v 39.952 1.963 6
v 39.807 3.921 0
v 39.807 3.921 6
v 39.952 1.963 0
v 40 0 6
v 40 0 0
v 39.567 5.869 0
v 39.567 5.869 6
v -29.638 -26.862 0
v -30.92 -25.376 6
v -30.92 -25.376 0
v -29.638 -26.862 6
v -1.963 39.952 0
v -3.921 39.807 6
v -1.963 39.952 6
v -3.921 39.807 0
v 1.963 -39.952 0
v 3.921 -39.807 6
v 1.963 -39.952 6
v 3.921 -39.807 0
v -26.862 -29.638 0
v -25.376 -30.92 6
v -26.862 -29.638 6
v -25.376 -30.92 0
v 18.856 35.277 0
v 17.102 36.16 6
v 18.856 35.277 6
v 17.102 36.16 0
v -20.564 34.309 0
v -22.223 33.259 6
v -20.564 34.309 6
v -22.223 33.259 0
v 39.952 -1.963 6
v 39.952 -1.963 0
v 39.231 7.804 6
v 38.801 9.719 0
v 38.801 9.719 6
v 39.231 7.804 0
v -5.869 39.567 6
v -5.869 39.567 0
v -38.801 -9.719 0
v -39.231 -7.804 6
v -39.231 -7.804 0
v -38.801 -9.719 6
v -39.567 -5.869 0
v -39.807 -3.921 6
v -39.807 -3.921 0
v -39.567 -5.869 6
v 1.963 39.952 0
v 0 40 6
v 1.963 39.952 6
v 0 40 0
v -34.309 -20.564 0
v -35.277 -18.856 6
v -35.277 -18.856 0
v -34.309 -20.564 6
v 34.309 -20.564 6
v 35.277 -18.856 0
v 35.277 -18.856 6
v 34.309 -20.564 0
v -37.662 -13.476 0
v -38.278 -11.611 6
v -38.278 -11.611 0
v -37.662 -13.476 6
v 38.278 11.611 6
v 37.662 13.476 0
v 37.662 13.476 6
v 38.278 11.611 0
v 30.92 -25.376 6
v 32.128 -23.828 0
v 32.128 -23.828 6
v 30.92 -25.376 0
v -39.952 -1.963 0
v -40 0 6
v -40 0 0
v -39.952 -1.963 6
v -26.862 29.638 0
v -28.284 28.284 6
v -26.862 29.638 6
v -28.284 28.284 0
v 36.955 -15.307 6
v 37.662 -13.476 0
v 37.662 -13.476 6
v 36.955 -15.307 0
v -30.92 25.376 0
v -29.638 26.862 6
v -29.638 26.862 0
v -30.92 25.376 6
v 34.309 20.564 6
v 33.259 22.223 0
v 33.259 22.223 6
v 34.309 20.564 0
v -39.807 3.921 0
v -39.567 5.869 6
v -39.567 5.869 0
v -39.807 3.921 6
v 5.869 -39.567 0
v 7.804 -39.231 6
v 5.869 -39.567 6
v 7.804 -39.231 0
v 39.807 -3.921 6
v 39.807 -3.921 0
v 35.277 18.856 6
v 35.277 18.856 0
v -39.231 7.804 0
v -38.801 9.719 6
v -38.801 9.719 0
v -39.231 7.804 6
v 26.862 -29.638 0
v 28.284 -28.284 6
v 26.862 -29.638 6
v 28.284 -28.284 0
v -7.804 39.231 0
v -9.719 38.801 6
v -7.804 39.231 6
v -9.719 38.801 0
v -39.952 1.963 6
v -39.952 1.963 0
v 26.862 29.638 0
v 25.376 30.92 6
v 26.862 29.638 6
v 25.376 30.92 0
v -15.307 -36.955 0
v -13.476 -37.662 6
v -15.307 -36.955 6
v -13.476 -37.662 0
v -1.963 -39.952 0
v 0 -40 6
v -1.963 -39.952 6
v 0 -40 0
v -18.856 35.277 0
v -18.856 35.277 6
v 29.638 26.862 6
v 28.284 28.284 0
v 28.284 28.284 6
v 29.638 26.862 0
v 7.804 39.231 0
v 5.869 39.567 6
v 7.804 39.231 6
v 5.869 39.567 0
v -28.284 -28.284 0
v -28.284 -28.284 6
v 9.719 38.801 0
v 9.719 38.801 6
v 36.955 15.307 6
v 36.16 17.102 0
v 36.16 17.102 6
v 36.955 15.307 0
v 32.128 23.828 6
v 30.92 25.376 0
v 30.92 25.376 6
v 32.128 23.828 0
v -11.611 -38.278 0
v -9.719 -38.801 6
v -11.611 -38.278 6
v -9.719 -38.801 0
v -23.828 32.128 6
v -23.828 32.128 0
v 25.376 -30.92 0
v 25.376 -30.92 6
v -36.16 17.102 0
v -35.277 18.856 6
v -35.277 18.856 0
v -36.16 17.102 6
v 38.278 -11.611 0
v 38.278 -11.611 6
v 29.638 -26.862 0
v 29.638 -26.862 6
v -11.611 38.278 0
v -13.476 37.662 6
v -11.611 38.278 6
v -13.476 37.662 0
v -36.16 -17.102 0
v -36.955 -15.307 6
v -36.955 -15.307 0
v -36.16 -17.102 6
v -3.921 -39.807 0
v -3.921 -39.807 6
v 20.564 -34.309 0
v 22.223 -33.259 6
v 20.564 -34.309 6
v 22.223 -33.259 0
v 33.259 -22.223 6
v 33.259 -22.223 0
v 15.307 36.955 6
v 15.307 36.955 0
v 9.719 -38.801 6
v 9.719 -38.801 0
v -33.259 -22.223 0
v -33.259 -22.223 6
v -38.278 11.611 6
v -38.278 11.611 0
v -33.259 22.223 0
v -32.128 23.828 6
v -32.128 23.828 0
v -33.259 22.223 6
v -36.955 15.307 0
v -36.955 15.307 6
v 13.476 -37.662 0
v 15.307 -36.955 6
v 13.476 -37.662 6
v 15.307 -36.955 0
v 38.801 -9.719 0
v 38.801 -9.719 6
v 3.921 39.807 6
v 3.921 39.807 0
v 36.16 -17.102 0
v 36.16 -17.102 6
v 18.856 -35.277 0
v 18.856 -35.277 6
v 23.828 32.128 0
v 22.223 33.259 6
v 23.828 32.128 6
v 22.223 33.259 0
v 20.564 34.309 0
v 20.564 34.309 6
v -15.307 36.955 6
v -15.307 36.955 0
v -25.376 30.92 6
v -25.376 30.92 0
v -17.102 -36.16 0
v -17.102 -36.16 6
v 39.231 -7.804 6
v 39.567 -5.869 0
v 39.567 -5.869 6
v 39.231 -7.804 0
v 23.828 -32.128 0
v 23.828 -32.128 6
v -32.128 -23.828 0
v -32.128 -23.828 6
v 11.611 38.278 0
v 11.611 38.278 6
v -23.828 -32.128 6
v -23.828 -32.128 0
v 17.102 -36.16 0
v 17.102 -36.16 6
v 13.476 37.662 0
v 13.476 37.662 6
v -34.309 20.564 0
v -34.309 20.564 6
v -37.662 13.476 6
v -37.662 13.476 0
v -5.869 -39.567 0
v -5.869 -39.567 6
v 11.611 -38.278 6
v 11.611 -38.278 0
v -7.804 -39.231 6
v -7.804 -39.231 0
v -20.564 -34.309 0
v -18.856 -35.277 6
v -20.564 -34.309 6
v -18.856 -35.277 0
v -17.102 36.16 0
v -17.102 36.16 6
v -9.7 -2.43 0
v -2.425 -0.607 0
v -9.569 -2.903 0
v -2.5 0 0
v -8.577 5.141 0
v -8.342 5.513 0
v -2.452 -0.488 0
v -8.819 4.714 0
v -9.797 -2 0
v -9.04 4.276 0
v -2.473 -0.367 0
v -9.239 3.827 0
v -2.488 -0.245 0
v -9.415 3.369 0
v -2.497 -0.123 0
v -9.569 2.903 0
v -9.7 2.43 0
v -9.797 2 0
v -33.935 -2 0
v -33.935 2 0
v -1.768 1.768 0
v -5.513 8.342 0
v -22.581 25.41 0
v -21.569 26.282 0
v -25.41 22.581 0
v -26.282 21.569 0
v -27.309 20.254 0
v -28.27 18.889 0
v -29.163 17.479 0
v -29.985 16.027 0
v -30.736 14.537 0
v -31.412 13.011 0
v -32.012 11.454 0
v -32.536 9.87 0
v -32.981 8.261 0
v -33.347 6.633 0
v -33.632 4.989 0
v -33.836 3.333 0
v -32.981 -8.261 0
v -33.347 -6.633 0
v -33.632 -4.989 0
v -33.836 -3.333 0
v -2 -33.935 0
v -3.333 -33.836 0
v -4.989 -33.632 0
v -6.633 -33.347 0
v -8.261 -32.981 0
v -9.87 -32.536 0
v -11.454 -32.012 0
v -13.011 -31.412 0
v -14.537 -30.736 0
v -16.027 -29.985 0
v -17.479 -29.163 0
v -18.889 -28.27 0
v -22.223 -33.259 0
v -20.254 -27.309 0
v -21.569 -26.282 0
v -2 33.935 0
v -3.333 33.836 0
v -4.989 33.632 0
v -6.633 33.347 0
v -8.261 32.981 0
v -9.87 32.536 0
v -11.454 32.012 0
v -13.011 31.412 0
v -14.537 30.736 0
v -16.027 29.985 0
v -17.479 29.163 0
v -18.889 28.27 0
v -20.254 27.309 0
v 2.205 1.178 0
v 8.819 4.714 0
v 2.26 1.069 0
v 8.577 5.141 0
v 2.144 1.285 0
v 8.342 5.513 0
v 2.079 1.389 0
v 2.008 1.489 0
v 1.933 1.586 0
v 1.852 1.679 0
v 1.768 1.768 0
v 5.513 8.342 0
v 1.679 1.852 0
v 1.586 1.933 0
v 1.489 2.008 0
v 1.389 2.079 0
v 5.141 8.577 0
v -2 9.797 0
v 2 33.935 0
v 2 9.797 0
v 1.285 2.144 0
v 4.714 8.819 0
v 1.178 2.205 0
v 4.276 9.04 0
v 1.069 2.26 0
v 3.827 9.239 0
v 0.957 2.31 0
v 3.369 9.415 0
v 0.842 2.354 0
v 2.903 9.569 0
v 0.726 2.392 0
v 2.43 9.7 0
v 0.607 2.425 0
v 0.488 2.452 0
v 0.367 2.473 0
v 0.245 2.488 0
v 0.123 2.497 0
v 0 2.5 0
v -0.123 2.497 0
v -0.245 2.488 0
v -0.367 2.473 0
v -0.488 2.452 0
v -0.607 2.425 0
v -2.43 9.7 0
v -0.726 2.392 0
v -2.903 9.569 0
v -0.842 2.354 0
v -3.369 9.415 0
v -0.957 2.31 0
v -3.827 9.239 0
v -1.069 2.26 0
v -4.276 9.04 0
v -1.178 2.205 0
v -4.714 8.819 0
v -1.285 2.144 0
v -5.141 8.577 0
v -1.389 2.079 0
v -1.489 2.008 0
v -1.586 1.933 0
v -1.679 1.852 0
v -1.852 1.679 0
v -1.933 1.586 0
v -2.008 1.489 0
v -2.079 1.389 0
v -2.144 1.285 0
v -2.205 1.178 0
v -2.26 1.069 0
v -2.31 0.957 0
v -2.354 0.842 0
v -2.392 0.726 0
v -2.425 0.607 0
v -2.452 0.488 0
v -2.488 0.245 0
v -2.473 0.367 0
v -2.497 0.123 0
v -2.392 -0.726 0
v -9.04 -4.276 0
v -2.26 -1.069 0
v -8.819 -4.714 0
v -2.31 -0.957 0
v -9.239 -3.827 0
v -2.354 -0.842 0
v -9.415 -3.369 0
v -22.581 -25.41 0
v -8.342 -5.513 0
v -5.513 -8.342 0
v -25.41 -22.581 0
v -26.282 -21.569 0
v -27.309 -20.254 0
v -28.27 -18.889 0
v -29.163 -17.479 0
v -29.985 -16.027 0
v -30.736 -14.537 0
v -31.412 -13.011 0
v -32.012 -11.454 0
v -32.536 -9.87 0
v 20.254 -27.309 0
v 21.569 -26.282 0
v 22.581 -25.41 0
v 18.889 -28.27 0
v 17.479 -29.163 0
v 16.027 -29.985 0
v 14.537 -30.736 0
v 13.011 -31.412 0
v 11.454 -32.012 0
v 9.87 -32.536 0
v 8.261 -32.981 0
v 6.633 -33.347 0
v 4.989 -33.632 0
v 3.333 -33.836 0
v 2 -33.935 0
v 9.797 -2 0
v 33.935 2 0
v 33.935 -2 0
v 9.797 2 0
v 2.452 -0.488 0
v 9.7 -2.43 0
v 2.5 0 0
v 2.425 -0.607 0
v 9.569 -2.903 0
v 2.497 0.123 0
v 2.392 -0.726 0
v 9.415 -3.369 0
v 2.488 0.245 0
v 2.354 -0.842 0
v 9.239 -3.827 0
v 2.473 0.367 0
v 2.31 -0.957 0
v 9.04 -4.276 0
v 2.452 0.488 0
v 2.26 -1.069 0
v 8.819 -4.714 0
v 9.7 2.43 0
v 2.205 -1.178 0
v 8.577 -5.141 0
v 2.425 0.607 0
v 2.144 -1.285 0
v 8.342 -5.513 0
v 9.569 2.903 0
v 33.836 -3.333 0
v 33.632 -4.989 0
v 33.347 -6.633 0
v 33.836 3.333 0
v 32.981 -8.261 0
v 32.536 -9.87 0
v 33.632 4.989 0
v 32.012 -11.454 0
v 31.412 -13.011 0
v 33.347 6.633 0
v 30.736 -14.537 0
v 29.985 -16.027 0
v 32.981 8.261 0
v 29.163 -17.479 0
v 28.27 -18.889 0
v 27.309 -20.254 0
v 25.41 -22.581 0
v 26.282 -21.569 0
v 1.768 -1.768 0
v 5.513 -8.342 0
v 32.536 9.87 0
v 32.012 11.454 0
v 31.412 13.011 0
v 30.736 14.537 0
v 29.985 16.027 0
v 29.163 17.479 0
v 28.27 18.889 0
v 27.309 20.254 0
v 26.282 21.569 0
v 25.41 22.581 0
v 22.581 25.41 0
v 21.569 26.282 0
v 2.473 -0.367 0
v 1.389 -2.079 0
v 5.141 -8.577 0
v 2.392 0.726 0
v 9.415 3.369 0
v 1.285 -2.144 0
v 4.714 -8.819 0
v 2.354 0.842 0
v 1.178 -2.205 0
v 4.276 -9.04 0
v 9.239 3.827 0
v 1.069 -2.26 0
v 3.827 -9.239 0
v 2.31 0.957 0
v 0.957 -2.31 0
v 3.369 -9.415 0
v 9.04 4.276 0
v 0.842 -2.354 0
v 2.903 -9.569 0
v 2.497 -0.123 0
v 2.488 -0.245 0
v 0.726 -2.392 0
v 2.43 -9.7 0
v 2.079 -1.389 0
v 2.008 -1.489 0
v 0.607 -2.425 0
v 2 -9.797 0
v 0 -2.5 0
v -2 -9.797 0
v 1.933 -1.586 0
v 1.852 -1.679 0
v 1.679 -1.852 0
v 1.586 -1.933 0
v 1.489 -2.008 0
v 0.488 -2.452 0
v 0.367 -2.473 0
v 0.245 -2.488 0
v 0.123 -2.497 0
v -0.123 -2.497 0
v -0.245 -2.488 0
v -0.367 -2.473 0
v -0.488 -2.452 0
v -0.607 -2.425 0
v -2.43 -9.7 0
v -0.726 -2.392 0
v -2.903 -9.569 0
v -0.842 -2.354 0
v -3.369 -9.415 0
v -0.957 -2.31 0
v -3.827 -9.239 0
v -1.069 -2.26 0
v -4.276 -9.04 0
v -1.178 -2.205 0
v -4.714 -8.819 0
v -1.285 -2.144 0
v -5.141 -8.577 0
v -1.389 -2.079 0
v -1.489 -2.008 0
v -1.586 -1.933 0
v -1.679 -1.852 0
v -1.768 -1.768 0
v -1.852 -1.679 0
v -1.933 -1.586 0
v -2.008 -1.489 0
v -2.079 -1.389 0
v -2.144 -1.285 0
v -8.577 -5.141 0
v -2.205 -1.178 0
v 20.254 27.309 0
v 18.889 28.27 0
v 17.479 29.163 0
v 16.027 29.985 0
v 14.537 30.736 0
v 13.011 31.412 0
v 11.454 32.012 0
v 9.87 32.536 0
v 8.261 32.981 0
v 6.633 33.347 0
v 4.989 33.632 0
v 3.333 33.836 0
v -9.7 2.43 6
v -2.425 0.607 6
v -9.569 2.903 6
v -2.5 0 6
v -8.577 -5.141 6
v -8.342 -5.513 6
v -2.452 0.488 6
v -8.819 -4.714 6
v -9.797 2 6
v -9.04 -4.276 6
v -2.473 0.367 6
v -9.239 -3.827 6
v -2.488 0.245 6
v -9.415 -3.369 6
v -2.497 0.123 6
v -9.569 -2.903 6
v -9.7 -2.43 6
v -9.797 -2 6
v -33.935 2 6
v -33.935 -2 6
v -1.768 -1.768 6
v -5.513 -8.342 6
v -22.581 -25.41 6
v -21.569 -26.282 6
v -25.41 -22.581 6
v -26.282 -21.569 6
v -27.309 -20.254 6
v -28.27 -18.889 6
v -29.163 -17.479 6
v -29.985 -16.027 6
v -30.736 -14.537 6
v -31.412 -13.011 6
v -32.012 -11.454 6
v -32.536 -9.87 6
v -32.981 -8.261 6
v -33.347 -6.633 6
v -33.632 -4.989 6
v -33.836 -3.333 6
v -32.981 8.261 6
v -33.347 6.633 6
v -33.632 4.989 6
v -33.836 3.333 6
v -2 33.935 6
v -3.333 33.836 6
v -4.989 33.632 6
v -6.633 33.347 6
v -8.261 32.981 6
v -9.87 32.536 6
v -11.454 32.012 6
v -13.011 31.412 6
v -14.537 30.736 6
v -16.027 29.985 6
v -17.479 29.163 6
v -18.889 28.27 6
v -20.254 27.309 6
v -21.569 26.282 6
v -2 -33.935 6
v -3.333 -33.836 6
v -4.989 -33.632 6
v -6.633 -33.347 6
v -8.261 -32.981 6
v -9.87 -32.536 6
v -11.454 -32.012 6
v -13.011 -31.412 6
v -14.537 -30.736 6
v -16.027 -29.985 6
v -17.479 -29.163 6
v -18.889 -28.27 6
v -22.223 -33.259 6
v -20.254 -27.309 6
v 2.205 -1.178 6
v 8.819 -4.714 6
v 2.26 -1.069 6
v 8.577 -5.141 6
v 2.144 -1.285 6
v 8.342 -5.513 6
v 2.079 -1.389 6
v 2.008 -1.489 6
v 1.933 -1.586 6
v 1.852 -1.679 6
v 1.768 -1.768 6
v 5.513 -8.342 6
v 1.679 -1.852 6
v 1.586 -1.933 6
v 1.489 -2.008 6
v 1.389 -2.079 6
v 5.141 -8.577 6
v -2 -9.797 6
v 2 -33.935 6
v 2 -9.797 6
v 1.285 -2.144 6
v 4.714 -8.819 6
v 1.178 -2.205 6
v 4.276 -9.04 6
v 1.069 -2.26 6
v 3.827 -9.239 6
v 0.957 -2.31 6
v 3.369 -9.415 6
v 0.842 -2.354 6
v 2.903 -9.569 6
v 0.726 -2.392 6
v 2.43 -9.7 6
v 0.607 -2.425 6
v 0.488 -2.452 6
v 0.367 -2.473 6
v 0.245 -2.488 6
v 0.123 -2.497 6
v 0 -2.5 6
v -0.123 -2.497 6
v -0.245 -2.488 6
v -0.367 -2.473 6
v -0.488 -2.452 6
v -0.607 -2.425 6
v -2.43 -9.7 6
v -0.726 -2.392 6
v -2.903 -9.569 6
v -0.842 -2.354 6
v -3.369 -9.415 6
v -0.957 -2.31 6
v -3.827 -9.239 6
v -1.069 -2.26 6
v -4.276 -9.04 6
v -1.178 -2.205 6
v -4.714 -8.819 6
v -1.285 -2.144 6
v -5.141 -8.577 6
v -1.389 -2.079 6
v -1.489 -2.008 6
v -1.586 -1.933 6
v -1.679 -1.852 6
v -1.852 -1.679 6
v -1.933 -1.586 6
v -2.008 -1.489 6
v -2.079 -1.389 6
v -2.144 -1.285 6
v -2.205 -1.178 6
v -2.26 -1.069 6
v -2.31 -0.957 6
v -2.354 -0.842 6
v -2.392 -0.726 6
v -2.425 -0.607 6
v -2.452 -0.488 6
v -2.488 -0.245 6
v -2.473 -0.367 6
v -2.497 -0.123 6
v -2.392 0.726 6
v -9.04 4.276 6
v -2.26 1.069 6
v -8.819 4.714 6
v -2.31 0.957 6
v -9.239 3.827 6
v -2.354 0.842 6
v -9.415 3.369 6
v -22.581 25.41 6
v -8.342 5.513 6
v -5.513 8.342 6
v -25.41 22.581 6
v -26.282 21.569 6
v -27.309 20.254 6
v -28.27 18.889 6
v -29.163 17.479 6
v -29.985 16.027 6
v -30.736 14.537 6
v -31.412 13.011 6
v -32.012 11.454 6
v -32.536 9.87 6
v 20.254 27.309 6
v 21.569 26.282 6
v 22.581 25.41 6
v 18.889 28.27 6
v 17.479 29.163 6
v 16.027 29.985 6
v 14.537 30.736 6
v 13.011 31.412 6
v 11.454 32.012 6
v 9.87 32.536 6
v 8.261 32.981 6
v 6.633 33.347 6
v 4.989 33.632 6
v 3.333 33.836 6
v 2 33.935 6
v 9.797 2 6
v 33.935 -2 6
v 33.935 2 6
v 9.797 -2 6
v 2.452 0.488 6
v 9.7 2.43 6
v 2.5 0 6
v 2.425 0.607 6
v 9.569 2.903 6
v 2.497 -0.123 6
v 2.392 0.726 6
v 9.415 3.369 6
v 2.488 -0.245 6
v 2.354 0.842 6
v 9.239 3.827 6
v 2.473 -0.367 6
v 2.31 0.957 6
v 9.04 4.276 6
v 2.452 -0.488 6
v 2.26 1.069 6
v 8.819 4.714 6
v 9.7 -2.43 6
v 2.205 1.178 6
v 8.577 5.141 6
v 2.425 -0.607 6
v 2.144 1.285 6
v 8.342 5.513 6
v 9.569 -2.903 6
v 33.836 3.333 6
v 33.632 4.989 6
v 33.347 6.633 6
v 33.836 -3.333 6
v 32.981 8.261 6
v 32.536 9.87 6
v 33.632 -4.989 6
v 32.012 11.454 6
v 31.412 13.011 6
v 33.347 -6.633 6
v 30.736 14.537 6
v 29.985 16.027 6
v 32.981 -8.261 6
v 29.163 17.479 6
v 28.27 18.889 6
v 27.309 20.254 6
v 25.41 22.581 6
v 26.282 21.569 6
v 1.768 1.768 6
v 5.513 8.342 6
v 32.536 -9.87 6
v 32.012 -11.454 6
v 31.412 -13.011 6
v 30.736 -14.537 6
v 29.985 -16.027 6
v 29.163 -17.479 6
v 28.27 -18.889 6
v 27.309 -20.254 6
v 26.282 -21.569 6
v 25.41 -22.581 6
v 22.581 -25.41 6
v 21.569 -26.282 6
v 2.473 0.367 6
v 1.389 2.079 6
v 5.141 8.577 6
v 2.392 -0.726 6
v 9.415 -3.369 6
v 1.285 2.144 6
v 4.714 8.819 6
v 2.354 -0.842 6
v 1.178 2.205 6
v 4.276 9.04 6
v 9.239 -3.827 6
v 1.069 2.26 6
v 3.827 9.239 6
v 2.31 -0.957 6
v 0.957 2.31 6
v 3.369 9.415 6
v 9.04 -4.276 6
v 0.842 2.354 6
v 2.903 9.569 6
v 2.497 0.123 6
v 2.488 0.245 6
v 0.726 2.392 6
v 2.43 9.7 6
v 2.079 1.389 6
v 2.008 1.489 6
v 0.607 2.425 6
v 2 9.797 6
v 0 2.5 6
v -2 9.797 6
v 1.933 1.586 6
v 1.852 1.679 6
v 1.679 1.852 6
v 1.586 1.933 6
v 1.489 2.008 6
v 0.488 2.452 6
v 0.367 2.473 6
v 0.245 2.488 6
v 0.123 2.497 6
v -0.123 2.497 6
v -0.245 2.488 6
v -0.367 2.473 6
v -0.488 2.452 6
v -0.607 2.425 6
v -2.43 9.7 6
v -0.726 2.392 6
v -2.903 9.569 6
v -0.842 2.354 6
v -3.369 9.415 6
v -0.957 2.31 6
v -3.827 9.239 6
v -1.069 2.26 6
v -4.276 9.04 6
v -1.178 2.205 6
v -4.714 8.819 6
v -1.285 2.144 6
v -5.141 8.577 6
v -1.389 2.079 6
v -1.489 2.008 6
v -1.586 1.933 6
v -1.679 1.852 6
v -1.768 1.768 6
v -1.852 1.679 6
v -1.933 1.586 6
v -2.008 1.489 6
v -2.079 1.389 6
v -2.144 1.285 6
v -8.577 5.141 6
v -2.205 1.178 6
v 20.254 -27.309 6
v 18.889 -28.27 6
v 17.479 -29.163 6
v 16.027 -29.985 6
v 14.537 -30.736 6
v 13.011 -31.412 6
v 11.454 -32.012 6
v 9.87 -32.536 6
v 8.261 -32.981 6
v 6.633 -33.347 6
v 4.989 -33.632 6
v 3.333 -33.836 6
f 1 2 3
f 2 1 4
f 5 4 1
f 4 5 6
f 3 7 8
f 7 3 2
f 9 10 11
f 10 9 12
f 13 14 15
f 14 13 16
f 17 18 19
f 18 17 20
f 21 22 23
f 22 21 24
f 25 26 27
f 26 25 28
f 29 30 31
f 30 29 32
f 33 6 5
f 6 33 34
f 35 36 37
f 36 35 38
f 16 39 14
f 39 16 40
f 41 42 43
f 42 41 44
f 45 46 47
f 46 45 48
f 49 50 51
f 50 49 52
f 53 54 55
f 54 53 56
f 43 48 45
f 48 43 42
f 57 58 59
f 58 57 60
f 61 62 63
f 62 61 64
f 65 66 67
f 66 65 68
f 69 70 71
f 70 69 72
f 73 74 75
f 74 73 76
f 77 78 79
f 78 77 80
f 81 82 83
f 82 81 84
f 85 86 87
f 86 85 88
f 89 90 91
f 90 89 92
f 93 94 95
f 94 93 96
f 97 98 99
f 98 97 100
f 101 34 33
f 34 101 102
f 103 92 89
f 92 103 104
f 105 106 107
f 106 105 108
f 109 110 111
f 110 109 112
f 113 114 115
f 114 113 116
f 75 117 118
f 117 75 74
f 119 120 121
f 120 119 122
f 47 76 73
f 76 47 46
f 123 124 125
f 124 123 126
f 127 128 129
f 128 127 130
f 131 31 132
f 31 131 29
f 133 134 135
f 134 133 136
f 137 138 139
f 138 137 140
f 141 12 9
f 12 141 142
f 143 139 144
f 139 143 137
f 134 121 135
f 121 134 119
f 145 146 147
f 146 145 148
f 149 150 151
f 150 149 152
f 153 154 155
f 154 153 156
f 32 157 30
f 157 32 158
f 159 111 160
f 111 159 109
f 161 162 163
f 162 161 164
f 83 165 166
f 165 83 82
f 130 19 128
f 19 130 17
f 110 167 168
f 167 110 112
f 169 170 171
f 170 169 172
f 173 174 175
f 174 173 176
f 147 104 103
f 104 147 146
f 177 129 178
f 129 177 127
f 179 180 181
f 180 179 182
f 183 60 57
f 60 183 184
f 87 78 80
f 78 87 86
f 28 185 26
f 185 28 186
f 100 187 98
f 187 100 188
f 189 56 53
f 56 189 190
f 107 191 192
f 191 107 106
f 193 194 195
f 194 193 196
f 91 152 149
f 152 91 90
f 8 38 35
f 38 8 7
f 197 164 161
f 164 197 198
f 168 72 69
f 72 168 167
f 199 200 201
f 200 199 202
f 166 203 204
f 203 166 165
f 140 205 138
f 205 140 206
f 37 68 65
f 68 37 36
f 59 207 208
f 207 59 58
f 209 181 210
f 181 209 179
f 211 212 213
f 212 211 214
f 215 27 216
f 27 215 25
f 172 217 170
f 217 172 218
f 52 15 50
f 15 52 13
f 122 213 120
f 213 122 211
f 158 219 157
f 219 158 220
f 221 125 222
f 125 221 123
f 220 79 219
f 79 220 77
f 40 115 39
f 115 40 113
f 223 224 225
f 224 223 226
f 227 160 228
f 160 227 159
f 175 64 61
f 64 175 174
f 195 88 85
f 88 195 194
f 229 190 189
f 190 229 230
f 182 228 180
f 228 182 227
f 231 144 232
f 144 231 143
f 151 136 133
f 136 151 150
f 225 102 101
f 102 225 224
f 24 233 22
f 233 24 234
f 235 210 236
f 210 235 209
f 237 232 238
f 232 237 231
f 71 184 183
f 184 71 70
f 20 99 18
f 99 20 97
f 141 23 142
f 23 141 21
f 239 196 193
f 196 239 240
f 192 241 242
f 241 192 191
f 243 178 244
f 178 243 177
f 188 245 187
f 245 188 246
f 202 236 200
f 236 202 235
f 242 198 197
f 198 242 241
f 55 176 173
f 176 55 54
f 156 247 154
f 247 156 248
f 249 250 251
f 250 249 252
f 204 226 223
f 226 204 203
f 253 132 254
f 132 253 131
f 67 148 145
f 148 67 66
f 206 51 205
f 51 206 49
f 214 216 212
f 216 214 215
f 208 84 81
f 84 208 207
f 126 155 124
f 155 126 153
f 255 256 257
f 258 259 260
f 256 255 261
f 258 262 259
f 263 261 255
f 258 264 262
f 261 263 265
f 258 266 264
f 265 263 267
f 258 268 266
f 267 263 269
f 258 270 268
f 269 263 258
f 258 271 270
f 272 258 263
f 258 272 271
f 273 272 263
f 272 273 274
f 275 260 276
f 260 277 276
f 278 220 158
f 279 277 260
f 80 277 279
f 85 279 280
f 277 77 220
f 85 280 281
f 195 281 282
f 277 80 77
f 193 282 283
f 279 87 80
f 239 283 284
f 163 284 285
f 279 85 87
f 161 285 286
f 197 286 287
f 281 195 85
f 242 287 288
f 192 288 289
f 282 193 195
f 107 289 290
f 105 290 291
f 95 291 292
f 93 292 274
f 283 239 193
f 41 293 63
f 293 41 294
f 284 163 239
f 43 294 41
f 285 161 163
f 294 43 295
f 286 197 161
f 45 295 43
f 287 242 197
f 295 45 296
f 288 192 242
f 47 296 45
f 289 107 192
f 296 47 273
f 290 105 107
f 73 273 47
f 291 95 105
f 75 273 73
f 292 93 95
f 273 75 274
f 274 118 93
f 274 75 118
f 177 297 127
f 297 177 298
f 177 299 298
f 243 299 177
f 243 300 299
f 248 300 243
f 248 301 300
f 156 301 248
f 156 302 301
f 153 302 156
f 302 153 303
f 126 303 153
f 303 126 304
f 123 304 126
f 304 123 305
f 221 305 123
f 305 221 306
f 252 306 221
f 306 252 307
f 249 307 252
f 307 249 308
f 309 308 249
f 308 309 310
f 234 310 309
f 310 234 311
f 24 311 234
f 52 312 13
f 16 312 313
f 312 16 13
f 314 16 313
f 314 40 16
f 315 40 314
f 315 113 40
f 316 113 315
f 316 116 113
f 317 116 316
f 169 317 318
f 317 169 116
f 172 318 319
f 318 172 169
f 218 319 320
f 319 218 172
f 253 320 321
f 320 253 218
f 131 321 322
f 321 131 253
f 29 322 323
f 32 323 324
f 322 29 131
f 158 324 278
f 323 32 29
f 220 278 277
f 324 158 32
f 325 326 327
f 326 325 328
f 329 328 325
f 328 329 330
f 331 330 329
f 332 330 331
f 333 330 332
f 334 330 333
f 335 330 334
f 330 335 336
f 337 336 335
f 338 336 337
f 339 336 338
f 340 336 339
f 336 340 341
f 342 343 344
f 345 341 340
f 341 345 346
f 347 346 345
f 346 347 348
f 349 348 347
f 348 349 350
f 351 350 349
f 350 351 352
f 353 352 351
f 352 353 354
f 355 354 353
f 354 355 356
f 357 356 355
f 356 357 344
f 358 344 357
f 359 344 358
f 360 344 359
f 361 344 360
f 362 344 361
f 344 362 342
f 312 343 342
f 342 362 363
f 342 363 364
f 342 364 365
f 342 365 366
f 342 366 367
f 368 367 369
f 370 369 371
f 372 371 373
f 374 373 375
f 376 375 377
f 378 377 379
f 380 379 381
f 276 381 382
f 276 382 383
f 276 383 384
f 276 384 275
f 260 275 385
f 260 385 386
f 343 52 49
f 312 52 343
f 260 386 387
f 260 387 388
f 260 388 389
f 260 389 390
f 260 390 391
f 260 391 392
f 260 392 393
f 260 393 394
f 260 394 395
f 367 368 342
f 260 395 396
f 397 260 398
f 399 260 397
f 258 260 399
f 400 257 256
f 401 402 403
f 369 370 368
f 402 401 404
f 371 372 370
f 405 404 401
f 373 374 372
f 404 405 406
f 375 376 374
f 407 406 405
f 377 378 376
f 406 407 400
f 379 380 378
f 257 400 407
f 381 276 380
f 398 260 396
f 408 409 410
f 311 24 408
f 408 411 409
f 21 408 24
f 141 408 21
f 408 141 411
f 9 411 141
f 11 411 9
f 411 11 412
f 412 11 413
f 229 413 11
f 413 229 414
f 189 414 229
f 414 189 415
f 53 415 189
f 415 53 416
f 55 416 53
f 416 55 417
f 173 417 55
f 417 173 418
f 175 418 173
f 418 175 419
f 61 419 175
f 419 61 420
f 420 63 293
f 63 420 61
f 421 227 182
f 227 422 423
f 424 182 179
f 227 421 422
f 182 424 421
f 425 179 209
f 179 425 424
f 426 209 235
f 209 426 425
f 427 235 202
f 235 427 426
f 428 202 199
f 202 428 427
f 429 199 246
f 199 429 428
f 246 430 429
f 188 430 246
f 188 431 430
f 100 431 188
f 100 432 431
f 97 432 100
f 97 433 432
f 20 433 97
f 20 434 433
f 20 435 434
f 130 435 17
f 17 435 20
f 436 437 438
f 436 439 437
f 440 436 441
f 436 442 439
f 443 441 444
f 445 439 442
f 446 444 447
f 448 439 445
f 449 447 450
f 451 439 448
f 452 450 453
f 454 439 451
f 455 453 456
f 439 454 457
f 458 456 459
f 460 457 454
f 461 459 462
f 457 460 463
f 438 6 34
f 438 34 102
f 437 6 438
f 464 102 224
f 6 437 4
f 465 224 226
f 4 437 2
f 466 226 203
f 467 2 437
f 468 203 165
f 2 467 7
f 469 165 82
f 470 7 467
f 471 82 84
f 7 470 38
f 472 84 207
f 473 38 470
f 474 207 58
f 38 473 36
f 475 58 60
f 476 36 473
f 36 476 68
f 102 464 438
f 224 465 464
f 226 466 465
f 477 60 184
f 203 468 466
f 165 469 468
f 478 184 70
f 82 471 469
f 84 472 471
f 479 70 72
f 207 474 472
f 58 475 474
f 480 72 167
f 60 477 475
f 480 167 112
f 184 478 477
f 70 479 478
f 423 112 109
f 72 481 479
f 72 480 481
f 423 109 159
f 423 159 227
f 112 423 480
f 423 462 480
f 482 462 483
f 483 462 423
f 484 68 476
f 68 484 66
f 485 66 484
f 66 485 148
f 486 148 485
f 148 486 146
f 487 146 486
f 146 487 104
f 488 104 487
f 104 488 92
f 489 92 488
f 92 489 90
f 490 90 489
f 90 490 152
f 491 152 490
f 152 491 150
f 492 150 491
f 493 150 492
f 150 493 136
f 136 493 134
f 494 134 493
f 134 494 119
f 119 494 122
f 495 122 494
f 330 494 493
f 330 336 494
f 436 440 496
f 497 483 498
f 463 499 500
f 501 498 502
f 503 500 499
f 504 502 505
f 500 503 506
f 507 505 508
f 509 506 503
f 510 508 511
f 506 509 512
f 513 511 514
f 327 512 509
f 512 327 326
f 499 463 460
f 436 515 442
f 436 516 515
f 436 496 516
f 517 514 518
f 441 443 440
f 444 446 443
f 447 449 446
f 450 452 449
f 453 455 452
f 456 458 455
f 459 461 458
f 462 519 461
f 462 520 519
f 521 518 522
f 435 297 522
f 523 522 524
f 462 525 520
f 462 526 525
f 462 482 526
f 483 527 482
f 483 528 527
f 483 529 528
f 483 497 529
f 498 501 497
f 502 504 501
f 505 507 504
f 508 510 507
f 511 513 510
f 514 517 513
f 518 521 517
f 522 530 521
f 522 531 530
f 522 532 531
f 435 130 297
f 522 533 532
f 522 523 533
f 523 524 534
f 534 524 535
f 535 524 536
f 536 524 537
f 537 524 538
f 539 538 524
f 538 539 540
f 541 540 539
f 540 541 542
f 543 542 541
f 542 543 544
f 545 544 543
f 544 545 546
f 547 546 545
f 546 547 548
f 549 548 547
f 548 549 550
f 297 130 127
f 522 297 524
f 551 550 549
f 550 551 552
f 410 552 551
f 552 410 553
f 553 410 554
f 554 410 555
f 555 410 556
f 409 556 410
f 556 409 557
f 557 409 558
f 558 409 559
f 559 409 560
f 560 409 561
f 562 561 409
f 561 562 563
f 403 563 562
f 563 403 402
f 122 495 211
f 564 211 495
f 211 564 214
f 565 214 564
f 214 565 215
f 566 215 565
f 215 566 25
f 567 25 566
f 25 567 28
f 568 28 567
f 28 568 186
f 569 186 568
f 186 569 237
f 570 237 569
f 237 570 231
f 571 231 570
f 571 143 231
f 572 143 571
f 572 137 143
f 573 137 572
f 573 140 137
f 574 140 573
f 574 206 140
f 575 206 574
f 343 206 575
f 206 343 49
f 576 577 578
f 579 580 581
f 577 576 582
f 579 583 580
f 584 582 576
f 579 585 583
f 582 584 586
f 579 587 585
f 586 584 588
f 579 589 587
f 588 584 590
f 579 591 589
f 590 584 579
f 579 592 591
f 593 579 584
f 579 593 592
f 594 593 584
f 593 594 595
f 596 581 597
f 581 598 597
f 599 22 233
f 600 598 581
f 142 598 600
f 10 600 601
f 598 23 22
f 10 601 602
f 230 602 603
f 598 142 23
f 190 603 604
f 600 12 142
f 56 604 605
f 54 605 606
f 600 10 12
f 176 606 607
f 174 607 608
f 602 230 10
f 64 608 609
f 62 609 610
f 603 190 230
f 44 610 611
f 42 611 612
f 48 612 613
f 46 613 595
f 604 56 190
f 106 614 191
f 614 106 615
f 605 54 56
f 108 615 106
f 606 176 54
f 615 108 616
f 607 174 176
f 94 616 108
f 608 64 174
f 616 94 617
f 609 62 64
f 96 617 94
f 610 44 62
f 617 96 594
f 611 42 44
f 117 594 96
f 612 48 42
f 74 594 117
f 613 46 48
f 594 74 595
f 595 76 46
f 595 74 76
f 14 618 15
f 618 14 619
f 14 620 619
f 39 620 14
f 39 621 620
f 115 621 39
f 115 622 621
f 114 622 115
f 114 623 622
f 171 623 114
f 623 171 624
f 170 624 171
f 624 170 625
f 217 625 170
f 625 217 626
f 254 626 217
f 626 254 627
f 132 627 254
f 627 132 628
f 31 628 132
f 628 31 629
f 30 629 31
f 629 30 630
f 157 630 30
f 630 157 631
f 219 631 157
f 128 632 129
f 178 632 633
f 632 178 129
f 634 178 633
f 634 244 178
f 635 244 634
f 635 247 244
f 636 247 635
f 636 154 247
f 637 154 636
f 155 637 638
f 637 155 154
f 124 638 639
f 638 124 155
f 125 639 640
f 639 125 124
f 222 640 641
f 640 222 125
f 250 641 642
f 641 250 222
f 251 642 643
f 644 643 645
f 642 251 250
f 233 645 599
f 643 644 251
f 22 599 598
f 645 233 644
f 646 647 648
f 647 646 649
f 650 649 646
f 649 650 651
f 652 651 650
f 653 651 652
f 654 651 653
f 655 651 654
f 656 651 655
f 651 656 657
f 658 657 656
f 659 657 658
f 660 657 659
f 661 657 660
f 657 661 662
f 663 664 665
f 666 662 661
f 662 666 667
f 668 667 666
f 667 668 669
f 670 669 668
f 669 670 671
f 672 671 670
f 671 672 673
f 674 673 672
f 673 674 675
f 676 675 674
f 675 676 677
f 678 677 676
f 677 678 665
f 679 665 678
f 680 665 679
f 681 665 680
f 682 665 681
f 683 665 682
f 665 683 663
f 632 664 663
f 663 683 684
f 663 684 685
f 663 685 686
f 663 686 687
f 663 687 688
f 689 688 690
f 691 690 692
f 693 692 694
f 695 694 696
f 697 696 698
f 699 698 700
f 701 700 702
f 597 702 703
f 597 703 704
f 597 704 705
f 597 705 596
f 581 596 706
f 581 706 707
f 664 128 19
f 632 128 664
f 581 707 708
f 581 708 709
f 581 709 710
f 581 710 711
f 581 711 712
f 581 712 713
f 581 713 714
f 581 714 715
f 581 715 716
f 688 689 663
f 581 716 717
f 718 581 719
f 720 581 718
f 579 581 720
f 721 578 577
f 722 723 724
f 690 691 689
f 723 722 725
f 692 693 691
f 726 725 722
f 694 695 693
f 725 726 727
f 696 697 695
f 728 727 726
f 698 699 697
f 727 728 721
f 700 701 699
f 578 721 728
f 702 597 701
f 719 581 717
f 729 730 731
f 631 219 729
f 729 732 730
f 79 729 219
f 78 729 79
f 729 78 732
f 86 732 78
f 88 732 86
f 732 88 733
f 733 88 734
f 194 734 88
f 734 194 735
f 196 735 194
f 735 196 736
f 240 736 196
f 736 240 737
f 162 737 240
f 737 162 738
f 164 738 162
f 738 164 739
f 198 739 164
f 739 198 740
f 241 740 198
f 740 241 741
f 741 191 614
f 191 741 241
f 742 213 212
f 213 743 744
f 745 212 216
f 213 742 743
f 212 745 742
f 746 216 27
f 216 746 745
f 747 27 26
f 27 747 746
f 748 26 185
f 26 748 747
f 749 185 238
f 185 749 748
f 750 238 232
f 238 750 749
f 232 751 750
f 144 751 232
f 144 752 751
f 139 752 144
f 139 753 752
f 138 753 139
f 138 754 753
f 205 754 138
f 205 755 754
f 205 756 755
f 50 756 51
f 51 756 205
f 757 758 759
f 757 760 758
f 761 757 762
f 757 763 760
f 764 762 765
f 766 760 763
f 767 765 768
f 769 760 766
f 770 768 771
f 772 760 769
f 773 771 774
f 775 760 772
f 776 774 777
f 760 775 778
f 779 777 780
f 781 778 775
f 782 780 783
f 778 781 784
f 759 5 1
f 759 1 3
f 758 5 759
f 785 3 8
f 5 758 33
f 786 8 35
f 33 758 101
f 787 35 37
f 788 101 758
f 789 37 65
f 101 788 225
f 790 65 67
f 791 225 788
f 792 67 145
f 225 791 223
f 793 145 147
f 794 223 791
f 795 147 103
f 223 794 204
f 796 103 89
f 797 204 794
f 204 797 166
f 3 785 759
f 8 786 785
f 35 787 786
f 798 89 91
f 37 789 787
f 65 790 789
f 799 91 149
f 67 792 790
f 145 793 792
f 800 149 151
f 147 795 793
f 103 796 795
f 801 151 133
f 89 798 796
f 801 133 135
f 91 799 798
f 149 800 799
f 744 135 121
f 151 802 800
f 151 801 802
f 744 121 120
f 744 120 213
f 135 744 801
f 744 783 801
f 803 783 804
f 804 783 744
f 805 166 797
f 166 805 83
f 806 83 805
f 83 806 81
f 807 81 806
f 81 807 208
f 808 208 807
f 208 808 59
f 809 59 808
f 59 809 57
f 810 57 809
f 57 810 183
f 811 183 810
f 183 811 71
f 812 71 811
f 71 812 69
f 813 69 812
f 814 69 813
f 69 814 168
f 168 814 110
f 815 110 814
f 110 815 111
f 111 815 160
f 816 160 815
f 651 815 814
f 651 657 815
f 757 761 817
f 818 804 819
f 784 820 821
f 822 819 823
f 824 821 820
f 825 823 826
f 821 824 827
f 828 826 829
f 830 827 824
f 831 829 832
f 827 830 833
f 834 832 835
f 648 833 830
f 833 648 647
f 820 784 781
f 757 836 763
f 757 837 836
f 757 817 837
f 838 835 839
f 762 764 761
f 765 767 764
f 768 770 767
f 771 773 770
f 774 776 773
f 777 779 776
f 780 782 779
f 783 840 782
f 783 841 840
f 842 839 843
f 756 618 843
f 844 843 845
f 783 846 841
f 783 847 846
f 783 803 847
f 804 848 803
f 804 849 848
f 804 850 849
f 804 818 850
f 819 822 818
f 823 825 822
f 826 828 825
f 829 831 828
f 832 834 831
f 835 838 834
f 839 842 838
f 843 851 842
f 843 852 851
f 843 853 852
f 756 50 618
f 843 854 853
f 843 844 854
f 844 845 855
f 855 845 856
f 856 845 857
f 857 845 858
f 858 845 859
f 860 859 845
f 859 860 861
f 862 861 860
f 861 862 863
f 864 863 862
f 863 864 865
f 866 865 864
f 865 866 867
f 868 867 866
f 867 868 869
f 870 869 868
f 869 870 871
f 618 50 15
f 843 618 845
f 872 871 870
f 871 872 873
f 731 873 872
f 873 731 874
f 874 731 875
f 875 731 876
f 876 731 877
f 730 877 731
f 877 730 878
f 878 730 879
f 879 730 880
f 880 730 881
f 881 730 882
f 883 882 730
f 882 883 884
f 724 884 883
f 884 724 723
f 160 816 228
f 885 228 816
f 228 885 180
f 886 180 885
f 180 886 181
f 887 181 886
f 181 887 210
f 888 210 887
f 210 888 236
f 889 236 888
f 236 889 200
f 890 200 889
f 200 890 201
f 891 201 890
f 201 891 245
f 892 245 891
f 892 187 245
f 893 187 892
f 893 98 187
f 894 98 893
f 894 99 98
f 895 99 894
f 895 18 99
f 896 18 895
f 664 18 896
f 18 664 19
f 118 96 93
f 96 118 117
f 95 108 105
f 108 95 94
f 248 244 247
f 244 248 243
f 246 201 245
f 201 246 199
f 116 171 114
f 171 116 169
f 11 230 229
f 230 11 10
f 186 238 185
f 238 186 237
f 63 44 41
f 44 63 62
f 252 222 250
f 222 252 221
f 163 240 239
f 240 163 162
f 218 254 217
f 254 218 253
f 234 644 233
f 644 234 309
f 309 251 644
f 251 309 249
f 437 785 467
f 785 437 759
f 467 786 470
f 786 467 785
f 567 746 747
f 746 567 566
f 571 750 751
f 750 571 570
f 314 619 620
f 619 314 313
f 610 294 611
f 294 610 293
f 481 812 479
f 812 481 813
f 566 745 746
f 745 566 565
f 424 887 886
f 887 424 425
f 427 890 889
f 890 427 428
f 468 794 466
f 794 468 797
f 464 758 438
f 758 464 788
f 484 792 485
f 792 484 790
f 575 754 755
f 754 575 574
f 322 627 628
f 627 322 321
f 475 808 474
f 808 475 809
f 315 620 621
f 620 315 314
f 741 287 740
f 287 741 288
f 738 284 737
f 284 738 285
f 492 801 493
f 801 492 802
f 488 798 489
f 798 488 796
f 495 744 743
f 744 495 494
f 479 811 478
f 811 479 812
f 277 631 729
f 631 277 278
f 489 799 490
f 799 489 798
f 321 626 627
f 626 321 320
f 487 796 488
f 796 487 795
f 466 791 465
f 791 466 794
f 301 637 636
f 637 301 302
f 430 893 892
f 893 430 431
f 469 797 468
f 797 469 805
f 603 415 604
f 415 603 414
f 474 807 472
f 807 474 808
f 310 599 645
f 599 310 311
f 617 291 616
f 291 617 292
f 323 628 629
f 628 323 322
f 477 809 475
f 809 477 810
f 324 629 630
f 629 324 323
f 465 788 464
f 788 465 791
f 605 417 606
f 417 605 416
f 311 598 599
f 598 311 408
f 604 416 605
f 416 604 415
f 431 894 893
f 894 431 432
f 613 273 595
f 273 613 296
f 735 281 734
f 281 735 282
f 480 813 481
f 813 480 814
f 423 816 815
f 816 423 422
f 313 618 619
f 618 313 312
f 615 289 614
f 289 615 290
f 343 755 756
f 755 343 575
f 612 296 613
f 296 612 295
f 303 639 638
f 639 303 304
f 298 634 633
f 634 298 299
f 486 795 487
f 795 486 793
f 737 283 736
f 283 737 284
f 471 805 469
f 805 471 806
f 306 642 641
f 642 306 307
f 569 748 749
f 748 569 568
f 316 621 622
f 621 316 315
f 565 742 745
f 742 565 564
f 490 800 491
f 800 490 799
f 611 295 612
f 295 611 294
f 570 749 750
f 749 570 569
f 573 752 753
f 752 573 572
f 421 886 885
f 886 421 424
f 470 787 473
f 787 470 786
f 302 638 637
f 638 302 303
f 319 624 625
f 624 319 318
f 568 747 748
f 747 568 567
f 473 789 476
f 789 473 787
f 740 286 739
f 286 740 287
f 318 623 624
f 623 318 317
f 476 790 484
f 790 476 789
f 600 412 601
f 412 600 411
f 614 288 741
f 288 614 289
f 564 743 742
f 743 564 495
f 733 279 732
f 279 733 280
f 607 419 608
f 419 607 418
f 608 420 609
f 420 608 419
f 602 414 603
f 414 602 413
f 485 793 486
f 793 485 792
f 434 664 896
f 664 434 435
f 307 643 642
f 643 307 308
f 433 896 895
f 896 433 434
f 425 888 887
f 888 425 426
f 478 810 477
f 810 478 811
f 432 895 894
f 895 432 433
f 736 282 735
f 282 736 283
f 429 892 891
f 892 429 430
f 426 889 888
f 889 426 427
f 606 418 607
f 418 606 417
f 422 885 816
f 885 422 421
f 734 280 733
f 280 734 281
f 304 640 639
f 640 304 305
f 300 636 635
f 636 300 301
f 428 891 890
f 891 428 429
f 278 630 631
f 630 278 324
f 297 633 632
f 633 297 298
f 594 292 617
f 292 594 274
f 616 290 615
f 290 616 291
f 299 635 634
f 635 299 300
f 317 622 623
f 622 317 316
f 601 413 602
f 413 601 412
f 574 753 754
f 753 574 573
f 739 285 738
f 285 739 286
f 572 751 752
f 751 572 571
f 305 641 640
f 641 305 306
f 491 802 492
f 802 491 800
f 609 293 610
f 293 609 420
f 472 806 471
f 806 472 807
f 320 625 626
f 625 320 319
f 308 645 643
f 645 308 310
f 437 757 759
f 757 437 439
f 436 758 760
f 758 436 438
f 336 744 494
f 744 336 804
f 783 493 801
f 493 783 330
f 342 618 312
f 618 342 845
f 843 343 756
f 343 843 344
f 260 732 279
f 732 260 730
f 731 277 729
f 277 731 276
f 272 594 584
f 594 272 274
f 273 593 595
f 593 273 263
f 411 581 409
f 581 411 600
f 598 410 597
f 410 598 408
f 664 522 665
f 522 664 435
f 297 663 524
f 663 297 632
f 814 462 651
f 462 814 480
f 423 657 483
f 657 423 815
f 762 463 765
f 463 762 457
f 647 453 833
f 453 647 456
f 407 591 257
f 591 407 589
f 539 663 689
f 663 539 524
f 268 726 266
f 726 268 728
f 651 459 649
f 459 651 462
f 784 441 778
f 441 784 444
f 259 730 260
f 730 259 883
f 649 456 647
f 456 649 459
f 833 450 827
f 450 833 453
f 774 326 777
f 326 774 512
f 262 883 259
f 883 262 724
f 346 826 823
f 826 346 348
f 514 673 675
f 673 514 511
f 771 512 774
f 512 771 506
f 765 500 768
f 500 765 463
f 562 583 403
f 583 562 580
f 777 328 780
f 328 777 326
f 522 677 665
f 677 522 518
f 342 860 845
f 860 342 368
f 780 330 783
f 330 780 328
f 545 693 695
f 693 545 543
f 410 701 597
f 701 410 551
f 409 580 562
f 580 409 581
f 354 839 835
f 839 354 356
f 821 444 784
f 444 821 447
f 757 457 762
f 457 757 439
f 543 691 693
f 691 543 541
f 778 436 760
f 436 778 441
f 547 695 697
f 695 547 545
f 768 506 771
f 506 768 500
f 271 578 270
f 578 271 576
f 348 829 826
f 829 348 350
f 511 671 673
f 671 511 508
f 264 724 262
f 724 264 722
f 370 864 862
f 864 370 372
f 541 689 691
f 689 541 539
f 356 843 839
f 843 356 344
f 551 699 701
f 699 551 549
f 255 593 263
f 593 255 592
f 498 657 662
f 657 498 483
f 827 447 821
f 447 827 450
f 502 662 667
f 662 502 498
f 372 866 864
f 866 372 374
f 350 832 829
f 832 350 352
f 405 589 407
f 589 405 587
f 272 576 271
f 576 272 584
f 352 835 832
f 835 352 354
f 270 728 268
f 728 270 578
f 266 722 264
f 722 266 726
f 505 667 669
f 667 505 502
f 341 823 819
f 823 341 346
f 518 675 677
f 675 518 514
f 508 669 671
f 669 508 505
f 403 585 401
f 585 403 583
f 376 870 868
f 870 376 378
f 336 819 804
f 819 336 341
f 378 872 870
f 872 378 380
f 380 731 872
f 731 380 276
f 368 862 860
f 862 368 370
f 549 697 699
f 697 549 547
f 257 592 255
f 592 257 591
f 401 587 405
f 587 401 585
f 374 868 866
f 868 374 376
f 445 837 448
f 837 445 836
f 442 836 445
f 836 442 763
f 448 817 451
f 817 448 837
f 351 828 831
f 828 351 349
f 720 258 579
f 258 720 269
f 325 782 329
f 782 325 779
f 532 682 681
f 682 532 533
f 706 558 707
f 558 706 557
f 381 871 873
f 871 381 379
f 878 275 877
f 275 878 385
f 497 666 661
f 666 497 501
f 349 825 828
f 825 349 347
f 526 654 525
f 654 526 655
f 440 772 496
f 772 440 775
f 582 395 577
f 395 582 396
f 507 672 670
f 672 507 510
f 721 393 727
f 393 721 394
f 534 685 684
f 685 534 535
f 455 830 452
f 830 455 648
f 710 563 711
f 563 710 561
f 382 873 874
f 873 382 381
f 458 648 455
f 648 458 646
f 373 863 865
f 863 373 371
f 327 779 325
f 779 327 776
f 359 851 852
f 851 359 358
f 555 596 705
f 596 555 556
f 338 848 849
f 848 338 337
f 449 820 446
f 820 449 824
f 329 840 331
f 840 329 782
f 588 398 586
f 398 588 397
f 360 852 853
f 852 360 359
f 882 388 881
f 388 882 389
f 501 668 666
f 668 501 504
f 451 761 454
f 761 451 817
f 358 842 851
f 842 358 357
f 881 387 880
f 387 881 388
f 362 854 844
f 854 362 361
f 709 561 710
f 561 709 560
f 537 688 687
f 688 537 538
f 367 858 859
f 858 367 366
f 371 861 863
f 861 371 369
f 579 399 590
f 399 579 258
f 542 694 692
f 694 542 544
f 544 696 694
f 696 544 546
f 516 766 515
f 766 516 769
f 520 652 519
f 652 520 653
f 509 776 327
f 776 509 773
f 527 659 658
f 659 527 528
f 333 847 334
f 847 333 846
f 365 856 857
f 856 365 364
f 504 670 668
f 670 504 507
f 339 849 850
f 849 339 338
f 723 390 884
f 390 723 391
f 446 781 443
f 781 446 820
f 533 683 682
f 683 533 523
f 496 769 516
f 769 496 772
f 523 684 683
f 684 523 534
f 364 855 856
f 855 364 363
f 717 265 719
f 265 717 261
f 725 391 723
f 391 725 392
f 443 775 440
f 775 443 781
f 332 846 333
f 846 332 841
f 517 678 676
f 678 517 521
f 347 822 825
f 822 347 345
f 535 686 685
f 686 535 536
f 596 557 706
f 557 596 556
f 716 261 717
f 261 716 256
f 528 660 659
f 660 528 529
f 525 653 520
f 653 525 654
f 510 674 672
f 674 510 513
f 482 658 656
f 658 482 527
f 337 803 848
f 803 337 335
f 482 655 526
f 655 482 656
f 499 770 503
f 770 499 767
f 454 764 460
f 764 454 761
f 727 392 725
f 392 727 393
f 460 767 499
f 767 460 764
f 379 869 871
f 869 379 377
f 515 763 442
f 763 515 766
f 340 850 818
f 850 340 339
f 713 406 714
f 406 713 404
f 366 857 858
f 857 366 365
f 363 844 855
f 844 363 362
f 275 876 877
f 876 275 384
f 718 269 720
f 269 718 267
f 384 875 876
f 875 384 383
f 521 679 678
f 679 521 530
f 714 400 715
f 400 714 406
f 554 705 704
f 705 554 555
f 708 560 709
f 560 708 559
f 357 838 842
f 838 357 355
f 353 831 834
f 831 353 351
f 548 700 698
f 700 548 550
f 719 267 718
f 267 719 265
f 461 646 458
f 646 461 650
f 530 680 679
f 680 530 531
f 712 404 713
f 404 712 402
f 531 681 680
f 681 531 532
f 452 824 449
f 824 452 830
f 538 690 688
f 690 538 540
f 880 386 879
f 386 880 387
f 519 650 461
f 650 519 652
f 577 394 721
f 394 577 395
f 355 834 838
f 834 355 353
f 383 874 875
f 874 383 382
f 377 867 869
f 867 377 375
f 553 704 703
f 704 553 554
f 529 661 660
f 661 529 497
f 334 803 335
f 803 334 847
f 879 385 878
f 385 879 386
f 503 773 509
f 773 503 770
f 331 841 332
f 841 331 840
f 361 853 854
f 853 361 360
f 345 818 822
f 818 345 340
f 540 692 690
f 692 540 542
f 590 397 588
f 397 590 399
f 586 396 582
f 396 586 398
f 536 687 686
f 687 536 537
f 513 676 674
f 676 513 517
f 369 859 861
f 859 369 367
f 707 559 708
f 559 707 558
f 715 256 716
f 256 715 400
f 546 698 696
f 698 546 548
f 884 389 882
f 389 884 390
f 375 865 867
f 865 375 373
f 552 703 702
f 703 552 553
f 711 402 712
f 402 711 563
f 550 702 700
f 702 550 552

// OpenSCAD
// Spoked wheel for a small sample cart
// Print orientation: flat on the bed, centred on origin

$fn = 128;

// ---- Dimensions (mm) ----
thickness    = 6;    // overall part thickness (Z)
rim_od       = 80;   // rim outer diameter
rim_width    = 6;    // rim radial width
hub_d        = 20;   // hub diameter
axle_d       = 5;    // axle hole diameter
spoke_count  = 8;    // number of spokes
spoke_width  = 4;    // spoke width
spoke_start_angle = 0; // first spoke along +X

// ---- Derived ----
rim_id       = rim_od - 2 * rim_width;      // rim inner diameter (68)
spoke_r0     = hub_d / 2 - 1;               // spoke starts inside hub (overlap)
spoke_r1     = rim_id / 2 + 1;              // spoke ends inside rim (overlap)
eps          = 0.5;                         // cut overshoot

difference() {
    union() {
        // Outer rim
        difference() {
            cylinder(d = rim_od, h = thickness);
            translate([0, 0, -eps])
                cylinder(d = rim_id, h = thickness + 2 * eps);
        }

        // Hub
        cylinder(d = hub_d, h = thickness);

        // Spokes
        for (i = [0 : spoke_count - 1])
            rotate([0, 0, spoke_start_angle + i * 360 / spoke_count])
                translate([spoke_r0, -spoke_width / 2, 0])
                    cube([spoke_r1 - spoke_r0, spoke_width, thickness]);
    }

    // Axle hole
    translate([0, 0, -eps])
        cylinder(d = axle_d, h = thickness + 2 * eps);
}
